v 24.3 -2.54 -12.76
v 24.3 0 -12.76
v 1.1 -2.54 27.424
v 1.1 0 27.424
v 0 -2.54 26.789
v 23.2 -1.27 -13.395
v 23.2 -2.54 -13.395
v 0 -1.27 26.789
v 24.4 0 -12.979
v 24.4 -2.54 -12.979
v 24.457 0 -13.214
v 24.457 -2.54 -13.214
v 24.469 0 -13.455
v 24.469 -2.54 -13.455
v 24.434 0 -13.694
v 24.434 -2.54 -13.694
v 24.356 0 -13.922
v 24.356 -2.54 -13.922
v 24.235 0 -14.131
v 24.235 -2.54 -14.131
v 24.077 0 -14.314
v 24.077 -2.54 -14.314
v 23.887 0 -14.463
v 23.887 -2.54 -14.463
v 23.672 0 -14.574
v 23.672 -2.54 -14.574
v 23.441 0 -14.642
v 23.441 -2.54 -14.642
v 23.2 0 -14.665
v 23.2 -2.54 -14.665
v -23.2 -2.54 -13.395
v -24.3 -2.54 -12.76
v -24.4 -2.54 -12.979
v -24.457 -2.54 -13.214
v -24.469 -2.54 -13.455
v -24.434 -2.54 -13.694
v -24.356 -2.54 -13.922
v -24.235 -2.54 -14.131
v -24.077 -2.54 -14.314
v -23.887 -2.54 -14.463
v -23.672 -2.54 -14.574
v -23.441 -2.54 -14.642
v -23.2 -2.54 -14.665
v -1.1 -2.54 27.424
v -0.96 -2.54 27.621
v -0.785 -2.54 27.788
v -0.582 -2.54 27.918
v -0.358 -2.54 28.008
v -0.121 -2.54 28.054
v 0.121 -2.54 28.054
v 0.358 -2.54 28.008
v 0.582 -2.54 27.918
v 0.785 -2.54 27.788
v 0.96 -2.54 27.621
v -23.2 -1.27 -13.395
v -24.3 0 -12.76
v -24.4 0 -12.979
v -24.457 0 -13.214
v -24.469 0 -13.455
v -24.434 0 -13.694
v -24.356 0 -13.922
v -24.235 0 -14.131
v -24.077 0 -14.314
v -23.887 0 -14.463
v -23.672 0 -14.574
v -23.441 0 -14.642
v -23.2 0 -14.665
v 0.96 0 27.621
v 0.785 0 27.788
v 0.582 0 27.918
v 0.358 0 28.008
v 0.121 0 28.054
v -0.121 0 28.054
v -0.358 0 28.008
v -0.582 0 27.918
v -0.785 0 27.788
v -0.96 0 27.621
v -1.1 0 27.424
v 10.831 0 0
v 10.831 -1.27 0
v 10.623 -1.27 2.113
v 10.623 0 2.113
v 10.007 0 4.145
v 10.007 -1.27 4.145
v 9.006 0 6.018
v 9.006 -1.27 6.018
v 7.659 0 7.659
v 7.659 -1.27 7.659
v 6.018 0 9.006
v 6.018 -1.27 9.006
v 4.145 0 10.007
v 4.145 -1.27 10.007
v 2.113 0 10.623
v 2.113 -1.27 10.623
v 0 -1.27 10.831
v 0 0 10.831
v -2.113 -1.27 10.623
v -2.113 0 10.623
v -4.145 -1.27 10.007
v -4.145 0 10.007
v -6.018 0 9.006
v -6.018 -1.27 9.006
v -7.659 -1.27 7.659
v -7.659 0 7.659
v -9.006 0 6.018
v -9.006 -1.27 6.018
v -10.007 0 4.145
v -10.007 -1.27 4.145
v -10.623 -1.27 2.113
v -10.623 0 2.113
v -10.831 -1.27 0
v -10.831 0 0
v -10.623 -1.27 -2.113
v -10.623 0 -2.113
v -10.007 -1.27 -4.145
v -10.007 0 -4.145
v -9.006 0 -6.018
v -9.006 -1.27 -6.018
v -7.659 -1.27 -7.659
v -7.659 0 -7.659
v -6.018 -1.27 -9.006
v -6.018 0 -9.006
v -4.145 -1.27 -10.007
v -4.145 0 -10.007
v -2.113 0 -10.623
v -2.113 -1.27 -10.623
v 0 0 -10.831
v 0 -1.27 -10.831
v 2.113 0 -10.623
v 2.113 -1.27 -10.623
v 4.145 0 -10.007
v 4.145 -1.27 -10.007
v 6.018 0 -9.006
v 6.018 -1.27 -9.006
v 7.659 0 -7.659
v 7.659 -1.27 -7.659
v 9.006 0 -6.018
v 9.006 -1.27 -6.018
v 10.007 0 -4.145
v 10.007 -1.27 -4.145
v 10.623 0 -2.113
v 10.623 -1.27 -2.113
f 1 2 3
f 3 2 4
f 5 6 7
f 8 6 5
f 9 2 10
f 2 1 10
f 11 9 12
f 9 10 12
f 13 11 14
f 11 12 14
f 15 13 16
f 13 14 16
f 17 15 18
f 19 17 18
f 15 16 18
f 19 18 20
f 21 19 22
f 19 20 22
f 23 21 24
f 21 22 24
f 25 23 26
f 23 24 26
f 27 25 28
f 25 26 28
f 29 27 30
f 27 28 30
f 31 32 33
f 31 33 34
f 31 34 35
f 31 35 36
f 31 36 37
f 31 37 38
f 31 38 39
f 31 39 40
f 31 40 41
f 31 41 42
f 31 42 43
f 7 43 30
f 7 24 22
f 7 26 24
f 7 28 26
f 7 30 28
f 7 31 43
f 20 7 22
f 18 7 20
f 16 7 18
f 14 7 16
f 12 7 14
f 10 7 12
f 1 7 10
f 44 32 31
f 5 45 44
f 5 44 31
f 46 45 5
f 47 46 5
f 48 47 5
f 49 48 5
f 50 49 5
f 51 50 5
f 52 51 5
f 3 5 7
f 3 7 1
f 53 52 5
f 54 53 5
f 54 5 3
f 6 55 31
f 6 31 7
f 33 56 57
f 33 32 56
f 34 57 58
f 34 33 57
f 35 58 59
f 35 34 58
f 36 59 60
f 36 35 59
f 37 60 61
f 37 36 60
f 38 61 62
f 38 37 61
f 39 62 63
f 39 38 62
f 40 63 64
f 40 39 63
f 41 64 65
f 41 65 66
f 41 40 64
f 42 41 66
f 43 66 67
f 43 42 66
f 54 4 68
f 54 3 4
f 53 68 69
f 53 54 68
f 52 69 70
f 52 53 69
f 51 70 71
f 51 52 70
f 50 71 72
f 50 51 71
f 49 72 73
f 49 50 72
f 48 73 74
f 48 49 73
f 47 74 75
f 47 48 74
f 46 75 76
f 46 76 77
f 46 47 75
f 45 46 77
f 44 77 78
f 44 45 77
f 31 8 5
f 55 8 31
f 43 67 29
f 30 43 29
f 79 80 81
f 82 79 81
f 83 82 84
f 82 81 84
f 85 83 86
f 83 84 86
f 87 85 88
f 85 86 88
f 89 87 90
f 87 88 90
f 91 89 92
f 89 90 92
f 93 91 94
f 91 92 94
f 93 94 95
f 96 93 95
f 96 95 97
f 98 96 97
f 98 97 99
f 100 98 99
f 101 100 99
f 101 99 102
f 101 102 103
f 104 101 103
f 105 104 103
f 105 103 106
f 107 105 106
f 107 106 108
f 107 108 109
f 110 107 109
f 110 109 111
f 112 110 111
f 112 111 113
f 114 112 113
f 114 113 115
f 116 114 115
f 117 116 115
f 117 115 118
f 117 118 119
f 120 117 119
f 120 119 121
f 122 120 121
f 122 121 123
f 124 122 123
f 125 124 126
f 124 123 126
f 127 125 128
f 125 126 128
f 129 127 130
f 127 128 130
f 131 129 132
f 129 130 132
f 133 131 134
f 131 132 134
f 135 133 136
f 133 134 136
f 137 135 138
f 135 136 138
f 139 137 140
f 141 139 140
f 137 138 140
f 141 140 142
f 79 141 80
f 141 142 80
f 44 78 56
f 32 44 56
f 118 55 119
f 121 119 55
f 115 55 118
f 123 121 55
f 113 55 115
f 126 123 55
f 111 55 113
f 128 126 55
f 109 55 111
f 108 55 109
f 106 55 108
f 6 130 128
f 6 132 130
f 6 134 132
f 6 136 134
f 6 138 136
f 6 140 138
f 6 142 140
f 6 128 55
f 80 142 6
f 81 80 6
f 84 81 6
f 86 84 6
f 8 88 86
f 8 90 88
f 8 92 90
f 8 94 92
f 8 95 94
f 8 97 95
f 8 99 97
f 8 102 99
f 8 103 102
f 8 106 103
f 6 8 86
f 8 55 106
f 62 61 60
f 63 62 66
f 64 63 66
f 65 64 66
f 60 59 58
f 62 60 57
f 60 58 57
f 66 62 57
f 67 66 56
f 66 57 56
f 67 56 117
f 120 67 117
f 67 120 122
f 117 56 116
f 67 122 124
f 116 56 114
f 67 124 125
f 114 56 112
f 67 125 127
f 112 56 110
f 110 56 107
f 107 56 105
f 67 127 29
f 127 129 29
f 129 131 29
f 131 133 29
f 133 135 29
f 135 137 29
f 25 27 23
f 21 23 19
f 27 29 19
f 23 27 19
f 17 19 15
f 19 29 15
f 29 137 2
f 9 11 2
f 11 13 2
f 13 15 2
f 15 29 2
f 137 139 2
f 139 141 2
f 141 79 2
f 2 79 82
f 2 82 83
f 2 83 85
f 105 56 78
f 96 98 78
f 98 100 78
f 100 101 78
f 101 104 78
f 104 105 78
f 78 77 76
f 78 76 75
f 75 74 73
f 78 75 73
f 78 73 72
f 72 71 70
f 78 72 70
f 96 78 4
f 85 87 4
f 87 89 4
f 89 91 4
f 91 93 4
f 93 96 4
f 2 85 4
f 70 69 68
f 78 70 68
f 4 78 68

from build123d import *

# Parameters (mm, degrees)
F1_DEPTH = 2.54
F2_R     = 1.27
F3_T     = 1.27
F4_R     = 10.8314490516
F5_DEPTH = 1.271


# Not quite as in the source:
# - a shell that OpenCascade refuses in one call is made with other operations: the cavity is built on its own and cut out


with BuildPart() as f1:
    # F0 (on Front) → F1 (new body)
    with BuildSketch(Plane.XZ):
        Polygon((25.4, -14.6646968374), (0, 29.3293936748), (-25.4, -14.6646968374), align=None)
    extrude(amount=F1_DEPTH)

    # F2
    f2_edges = [f1.edges().sort_by_distance(p)[0] for p in [
        (-25.4, -1.27, -14.664697),
        (25.4, -1.27, -14.664697),
        (0, -1.27, 29.329394),
    ]]
    fillet(f2_edges, radius=F2_R)

    # F3: shell of thickness 1.27, made by hand


with BuildPart() as f3_core1:
    # F3_t2: copy of F1
    add(f1.part)

    # the walls: a layer under each face that stays
    f3_faces = [f3_core1.faces().sort_by_distance(p)[0] for p in [
        (12.7, -1.27, 7.3323484187),
        (0, 0, 6.6973484187),
        (0, -1.27, -14.6646968374),
        (-12.7, -1.27, 7.3323484187),
    ]]
    thicken(f3_faces, amount=-F3_T, mode=Mode.SUBTRACT)


with BuildPart() as f1_1:
    add(f1.part)

    # what is left inside the walls is the cavity
    f3_cavity = [f3_core1.part.solids().sort_by_distance(p)[0] for p in [
        (0, -1.2827, 0),
    ]]
    add(f3_cavity, mode=Mode.SUBTRACT)

    # F4 (on face) → F5 (cut, through all)
    with BuildSketch(Plane.XZ.offset(1.27)):
        Circle(F4_R)
    extrude(amount=-F5_DEPTH, mode=Mode.SUBTRACT)


solid = f1_1.part
